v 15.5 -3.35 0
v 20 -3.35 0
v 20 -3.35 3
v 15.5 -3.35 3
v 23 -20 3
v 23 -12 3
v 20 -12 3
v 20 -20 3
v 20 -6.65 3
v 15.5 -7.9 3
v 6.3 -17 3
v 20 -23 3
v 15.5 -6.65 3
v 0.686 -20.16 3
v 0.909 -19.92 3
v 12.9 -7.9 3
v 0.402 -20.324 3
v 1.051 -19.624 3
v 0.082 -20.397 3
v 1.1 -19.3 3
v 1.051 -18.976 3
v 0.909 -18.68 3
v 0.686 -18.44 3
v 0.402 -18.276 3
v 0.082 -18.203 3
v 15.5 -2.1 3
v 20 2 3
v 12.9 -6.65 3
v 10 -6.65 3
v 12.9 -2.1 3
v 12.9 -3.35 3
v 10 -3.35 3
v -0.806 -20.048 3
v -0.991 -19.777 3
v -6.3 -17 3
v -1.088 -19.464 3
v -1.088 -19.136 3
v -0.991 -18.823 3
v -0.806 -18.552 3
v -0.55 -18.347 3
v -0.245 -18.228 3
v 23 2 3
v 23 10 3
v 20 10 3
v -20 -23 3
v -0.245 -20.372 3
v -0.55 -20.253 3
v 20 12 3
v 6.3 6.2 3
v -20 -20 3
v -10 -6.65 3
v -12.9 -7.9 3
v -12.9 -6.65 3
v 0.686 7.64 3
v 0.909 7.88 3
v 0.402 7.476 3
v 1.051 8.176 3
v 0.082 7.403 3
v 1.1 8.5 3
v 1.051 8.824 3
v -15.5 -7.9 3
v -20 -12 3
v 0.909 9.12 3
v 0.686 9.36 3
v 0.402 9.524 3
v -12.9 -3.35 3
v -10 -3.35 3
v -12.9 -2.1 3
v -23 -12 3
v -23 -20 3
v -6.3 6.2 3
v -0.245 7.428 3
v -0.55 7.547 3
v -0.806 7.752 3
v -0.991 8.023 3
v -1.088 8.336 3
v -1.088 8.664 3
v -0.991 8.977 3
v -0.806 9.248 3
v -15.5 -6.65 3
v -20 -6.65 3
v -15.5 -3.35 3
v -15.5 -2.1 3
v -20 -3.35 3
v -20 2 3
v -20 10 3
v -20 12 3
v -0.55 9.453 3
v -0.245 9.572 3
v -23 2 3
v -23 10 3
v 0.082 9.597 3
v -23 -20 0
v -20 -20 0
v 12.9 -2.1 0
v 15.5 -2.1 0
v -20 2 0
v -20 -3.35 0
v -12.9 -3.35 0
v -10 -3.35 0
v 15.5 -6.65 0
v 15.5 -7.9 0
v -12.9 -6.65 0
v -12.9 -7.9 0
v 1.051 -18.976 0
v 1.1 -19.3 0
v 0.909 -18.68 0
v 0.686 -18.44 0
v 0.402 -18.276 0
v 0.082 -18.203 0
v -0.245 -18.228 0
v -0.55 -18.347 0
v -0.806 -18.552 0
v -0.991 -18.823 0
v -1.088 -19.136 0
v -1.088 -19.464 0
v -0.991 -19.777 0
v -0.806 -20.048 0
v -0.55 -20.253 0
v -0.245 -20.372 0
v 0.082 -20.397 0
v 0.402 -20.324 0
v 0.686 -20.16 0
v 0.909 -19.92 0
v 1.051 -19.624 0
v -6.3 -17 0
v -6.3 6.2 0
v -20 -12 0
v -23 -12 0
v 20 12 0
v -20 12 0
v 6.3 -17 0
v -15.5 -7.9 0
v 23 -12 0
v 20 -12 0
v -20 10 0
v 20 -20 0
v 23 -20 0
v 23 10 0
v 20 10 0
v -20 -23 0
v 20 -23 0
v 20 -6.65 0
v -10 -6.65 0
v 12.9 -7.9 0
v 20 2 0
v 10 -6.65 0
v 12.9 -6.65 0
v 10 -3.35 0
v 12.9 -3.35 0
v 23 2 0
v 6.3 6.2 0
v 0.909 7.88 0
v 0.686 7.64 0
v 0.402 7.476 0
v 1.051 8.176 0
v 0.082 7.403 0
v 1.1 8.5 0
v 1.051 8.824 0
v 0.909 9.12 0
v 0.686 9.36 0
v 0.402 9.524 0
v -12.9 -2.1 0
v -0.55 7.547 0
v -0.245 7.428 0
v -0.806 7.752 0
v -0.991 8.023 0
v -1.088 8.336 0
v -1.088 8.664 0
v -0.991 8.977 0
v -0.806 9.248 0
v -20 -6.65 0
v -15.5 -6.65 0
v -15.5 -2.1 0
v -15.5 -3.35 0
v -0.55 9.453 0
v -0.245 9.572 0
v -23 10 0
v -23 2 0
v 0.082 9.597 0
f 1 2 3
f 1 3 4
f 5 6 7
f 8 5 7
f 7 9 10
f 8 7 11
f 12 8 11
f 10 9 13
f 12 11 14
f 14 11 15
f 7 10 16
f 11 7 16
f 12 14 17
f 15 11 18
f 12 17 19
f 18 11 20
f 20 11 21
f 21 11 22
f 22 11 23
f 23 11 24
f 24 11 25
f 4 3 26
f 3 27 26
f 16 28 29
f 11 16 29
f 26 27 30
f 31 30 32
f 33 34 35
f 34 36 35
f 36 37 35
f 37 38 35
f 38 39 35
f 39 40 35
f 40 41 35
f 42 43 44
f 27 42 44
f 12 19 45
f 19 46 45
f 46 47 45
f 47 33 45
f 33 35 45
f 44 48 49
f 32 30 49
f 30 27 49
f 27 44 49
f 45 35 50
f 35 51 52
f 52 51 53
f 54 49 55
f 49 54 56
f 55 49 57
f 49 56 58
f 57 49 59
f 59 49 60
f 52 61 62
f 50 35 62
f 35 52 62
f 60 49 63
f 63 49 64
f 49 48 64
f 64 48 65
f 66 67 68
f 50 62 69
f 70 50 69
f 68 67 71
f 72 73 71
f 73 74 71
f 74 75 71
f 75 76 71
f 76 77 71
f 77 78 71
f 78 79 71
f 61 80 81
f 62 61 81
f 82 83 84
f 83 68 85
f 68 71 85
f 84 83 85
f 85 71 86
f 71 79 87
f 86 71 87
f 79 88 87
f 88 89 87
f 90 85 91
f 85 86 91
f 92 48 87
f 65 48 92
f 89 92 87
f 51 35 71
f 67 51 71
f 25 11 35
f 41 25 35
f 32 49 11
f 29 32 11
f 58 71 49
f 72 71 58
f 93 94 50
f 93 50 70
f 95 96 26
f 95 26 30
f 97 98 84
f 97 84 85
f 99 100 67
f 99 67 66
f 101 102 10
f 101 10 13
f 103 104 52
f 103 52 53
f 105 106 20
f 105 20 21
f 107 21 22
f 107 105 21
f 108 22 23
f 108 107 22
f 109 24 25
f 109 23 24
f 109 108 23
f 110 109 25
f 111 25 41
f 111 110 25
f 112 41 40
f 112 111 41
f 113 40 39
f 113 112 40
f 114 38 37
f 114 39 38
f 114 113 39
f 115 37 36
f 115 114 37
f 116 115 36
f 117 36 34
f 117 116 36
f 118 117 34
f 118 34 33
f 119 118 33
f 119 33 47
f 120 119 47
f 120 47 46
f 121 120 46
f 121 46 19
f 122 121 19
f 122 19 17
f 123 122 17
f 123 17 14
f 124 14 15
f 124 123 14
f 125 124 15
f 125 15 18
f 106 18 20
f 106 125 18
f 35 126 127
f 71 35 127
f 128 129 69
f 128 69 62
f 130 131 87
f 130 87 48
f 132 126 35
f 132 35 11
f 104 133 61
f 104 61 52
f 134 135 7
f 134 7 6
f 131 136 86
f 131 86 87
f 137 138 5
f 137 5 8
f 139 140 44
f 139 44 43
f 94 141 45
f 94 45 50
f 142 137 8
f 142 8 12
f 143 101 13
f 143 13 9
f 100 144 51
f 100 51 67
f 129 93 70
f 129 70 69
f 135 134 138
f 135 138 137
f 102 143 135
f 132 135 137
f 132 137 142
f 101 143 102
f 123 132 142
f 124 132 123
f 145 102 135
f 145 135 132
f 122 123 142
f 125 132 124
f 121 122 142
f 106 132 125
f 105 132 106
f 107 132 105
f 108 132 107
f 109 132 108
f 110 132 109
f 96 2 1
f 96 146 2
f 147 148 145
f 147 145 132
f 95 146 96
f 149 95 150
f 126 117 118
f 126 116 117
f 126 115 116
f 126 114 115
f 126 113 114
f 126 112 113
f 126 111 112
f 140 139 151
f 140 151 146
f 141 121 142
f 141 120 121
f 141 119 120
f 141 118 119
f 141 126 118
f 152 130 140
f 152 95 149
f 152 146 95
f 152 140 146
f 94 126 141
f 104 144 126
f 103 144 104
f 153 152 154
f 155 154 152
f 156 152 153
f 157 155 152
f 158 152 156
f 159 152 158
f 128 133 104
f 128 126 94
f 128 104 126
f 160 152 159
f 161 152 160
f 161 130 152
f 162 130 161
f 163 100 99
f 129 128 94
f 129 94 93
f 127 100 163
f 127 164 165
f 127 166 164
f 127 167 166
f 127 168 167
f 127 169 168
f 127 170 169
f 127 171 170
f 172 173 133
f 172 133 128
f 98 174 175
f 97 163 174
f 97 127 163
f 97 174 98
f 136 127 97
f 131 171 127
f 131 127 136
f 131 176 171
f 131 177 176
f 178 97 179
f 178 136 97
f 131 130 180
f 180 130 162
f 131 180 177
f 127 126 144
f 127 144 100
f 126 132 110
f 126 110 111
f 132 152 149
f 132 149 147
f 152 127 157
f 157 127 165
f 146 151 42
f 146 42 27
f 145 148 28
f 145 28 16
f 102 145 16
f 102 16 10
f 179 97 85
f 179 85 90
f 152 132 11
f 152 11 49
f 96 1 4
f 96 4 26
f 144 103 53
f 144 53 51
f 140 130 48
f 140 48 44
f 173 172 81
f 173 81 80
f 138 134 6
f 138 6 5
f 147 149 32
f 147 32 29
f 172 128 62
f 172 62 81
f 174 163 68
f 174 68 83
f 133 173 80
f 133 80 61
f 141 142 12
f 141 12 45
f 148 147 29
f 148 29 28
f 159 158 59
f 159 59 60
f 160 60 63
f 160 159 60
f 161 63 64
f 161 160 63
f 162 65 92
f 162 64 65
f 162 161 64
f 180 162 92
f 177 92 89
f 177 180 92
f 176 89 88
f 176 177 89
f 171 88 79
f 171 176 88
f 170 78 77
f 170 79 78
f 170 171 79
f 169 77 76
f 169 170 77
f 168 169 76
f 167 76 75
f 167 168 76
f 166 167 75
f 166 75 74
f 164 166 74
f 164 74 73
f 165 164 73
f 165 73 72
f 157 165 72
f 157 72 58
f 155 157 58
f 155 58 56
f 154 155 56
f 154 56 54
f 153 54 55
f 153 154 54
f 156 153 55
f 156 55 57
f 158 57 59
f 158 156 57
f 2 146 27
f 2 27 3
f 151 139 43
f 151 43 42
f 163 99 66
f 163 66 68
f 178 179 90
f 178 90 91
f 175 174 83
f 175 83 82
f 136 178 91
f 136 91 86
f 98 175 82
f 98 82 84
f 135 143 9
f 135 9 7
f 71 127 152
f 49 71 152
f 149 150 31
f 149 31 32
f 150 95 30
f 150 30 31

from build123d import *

# Parameters (mm, degrees)
ESKIZ_KONTUR_W        = 12.6
ESKIZ_KONTUR_H        = 23.2
PLASTINA_DEPTH        = 3
OTVERSTIYA_DEPTH      = 33.664965942
OTVERSTIYA_DEPTH_BACK = 33.664965942
ESKIZ_OTVERSTIYA_R    = 1.1


with BuildPart() as part:
    # Eskiz_kontur → Plastina (new body)
    with BuildSketch(Plane.XY):
        Polygon((20, -3.35), (15.5, -3.35), (15.5, -2.1), (12.9, -2.1), (12.9, -3.35), (10, -3.35), (10, -6.65), (12.9, -6.65), (12.9, -7.9), (15.5, -7.9), (15.5, -6.65), (20, -6.65), (20, -12), (23, -12), (23, -20), (20, -20), (20, -23), (-20, -23), (-20, -20), (-23, -20), (-23, -12), (-20, -12), (-20, -6.65), (-15.5, -6.65), (-15.5, -7.9), (-12.9, -7.9), (-12.9, -6.65), (-10, -6.65), (-10, -3.35), (-12.9, -3.35), (-12.9, -2.1), (-15.5, -2.1), (-15.5, -3.35), (-20, -3.35), (-20, 2), (-23, 2), (-23, 10), (-20, 10), (-20, 12), (20, 12), (20, 10), (23, 10), (23, 2), (20, 2), align=None)
        with Locations((0, -5.4)):
            Rectangle(ESKIZ_KONTUR_W, ESKIZ_KONTUR_H, mode=Mode.SUBTRACT)
    extrude(amount=PLASTINA_DEPTH)

    # Eskiz_otverstiya → Otverstiya (cut, two sides: drawn at the far end of the back side and taken through both)
    with BuildSketch(Plane.XY.offset(-OTVERSTIYA_DEPTH_BACK)):
        with Locations((0, -19.3)):
            Circle(ESKIZ_OTVERSTIYA_R)
        with Locations((0, 8.5)):
            Circle(ESKIZ_OTVERSTIYA_R)
    extrude(amount=OTVERSTIYA_DEPTH + OTVERSTIYA_DEPTH_BACK, mode=Mode.SUBTRACT)


solid = part.part
